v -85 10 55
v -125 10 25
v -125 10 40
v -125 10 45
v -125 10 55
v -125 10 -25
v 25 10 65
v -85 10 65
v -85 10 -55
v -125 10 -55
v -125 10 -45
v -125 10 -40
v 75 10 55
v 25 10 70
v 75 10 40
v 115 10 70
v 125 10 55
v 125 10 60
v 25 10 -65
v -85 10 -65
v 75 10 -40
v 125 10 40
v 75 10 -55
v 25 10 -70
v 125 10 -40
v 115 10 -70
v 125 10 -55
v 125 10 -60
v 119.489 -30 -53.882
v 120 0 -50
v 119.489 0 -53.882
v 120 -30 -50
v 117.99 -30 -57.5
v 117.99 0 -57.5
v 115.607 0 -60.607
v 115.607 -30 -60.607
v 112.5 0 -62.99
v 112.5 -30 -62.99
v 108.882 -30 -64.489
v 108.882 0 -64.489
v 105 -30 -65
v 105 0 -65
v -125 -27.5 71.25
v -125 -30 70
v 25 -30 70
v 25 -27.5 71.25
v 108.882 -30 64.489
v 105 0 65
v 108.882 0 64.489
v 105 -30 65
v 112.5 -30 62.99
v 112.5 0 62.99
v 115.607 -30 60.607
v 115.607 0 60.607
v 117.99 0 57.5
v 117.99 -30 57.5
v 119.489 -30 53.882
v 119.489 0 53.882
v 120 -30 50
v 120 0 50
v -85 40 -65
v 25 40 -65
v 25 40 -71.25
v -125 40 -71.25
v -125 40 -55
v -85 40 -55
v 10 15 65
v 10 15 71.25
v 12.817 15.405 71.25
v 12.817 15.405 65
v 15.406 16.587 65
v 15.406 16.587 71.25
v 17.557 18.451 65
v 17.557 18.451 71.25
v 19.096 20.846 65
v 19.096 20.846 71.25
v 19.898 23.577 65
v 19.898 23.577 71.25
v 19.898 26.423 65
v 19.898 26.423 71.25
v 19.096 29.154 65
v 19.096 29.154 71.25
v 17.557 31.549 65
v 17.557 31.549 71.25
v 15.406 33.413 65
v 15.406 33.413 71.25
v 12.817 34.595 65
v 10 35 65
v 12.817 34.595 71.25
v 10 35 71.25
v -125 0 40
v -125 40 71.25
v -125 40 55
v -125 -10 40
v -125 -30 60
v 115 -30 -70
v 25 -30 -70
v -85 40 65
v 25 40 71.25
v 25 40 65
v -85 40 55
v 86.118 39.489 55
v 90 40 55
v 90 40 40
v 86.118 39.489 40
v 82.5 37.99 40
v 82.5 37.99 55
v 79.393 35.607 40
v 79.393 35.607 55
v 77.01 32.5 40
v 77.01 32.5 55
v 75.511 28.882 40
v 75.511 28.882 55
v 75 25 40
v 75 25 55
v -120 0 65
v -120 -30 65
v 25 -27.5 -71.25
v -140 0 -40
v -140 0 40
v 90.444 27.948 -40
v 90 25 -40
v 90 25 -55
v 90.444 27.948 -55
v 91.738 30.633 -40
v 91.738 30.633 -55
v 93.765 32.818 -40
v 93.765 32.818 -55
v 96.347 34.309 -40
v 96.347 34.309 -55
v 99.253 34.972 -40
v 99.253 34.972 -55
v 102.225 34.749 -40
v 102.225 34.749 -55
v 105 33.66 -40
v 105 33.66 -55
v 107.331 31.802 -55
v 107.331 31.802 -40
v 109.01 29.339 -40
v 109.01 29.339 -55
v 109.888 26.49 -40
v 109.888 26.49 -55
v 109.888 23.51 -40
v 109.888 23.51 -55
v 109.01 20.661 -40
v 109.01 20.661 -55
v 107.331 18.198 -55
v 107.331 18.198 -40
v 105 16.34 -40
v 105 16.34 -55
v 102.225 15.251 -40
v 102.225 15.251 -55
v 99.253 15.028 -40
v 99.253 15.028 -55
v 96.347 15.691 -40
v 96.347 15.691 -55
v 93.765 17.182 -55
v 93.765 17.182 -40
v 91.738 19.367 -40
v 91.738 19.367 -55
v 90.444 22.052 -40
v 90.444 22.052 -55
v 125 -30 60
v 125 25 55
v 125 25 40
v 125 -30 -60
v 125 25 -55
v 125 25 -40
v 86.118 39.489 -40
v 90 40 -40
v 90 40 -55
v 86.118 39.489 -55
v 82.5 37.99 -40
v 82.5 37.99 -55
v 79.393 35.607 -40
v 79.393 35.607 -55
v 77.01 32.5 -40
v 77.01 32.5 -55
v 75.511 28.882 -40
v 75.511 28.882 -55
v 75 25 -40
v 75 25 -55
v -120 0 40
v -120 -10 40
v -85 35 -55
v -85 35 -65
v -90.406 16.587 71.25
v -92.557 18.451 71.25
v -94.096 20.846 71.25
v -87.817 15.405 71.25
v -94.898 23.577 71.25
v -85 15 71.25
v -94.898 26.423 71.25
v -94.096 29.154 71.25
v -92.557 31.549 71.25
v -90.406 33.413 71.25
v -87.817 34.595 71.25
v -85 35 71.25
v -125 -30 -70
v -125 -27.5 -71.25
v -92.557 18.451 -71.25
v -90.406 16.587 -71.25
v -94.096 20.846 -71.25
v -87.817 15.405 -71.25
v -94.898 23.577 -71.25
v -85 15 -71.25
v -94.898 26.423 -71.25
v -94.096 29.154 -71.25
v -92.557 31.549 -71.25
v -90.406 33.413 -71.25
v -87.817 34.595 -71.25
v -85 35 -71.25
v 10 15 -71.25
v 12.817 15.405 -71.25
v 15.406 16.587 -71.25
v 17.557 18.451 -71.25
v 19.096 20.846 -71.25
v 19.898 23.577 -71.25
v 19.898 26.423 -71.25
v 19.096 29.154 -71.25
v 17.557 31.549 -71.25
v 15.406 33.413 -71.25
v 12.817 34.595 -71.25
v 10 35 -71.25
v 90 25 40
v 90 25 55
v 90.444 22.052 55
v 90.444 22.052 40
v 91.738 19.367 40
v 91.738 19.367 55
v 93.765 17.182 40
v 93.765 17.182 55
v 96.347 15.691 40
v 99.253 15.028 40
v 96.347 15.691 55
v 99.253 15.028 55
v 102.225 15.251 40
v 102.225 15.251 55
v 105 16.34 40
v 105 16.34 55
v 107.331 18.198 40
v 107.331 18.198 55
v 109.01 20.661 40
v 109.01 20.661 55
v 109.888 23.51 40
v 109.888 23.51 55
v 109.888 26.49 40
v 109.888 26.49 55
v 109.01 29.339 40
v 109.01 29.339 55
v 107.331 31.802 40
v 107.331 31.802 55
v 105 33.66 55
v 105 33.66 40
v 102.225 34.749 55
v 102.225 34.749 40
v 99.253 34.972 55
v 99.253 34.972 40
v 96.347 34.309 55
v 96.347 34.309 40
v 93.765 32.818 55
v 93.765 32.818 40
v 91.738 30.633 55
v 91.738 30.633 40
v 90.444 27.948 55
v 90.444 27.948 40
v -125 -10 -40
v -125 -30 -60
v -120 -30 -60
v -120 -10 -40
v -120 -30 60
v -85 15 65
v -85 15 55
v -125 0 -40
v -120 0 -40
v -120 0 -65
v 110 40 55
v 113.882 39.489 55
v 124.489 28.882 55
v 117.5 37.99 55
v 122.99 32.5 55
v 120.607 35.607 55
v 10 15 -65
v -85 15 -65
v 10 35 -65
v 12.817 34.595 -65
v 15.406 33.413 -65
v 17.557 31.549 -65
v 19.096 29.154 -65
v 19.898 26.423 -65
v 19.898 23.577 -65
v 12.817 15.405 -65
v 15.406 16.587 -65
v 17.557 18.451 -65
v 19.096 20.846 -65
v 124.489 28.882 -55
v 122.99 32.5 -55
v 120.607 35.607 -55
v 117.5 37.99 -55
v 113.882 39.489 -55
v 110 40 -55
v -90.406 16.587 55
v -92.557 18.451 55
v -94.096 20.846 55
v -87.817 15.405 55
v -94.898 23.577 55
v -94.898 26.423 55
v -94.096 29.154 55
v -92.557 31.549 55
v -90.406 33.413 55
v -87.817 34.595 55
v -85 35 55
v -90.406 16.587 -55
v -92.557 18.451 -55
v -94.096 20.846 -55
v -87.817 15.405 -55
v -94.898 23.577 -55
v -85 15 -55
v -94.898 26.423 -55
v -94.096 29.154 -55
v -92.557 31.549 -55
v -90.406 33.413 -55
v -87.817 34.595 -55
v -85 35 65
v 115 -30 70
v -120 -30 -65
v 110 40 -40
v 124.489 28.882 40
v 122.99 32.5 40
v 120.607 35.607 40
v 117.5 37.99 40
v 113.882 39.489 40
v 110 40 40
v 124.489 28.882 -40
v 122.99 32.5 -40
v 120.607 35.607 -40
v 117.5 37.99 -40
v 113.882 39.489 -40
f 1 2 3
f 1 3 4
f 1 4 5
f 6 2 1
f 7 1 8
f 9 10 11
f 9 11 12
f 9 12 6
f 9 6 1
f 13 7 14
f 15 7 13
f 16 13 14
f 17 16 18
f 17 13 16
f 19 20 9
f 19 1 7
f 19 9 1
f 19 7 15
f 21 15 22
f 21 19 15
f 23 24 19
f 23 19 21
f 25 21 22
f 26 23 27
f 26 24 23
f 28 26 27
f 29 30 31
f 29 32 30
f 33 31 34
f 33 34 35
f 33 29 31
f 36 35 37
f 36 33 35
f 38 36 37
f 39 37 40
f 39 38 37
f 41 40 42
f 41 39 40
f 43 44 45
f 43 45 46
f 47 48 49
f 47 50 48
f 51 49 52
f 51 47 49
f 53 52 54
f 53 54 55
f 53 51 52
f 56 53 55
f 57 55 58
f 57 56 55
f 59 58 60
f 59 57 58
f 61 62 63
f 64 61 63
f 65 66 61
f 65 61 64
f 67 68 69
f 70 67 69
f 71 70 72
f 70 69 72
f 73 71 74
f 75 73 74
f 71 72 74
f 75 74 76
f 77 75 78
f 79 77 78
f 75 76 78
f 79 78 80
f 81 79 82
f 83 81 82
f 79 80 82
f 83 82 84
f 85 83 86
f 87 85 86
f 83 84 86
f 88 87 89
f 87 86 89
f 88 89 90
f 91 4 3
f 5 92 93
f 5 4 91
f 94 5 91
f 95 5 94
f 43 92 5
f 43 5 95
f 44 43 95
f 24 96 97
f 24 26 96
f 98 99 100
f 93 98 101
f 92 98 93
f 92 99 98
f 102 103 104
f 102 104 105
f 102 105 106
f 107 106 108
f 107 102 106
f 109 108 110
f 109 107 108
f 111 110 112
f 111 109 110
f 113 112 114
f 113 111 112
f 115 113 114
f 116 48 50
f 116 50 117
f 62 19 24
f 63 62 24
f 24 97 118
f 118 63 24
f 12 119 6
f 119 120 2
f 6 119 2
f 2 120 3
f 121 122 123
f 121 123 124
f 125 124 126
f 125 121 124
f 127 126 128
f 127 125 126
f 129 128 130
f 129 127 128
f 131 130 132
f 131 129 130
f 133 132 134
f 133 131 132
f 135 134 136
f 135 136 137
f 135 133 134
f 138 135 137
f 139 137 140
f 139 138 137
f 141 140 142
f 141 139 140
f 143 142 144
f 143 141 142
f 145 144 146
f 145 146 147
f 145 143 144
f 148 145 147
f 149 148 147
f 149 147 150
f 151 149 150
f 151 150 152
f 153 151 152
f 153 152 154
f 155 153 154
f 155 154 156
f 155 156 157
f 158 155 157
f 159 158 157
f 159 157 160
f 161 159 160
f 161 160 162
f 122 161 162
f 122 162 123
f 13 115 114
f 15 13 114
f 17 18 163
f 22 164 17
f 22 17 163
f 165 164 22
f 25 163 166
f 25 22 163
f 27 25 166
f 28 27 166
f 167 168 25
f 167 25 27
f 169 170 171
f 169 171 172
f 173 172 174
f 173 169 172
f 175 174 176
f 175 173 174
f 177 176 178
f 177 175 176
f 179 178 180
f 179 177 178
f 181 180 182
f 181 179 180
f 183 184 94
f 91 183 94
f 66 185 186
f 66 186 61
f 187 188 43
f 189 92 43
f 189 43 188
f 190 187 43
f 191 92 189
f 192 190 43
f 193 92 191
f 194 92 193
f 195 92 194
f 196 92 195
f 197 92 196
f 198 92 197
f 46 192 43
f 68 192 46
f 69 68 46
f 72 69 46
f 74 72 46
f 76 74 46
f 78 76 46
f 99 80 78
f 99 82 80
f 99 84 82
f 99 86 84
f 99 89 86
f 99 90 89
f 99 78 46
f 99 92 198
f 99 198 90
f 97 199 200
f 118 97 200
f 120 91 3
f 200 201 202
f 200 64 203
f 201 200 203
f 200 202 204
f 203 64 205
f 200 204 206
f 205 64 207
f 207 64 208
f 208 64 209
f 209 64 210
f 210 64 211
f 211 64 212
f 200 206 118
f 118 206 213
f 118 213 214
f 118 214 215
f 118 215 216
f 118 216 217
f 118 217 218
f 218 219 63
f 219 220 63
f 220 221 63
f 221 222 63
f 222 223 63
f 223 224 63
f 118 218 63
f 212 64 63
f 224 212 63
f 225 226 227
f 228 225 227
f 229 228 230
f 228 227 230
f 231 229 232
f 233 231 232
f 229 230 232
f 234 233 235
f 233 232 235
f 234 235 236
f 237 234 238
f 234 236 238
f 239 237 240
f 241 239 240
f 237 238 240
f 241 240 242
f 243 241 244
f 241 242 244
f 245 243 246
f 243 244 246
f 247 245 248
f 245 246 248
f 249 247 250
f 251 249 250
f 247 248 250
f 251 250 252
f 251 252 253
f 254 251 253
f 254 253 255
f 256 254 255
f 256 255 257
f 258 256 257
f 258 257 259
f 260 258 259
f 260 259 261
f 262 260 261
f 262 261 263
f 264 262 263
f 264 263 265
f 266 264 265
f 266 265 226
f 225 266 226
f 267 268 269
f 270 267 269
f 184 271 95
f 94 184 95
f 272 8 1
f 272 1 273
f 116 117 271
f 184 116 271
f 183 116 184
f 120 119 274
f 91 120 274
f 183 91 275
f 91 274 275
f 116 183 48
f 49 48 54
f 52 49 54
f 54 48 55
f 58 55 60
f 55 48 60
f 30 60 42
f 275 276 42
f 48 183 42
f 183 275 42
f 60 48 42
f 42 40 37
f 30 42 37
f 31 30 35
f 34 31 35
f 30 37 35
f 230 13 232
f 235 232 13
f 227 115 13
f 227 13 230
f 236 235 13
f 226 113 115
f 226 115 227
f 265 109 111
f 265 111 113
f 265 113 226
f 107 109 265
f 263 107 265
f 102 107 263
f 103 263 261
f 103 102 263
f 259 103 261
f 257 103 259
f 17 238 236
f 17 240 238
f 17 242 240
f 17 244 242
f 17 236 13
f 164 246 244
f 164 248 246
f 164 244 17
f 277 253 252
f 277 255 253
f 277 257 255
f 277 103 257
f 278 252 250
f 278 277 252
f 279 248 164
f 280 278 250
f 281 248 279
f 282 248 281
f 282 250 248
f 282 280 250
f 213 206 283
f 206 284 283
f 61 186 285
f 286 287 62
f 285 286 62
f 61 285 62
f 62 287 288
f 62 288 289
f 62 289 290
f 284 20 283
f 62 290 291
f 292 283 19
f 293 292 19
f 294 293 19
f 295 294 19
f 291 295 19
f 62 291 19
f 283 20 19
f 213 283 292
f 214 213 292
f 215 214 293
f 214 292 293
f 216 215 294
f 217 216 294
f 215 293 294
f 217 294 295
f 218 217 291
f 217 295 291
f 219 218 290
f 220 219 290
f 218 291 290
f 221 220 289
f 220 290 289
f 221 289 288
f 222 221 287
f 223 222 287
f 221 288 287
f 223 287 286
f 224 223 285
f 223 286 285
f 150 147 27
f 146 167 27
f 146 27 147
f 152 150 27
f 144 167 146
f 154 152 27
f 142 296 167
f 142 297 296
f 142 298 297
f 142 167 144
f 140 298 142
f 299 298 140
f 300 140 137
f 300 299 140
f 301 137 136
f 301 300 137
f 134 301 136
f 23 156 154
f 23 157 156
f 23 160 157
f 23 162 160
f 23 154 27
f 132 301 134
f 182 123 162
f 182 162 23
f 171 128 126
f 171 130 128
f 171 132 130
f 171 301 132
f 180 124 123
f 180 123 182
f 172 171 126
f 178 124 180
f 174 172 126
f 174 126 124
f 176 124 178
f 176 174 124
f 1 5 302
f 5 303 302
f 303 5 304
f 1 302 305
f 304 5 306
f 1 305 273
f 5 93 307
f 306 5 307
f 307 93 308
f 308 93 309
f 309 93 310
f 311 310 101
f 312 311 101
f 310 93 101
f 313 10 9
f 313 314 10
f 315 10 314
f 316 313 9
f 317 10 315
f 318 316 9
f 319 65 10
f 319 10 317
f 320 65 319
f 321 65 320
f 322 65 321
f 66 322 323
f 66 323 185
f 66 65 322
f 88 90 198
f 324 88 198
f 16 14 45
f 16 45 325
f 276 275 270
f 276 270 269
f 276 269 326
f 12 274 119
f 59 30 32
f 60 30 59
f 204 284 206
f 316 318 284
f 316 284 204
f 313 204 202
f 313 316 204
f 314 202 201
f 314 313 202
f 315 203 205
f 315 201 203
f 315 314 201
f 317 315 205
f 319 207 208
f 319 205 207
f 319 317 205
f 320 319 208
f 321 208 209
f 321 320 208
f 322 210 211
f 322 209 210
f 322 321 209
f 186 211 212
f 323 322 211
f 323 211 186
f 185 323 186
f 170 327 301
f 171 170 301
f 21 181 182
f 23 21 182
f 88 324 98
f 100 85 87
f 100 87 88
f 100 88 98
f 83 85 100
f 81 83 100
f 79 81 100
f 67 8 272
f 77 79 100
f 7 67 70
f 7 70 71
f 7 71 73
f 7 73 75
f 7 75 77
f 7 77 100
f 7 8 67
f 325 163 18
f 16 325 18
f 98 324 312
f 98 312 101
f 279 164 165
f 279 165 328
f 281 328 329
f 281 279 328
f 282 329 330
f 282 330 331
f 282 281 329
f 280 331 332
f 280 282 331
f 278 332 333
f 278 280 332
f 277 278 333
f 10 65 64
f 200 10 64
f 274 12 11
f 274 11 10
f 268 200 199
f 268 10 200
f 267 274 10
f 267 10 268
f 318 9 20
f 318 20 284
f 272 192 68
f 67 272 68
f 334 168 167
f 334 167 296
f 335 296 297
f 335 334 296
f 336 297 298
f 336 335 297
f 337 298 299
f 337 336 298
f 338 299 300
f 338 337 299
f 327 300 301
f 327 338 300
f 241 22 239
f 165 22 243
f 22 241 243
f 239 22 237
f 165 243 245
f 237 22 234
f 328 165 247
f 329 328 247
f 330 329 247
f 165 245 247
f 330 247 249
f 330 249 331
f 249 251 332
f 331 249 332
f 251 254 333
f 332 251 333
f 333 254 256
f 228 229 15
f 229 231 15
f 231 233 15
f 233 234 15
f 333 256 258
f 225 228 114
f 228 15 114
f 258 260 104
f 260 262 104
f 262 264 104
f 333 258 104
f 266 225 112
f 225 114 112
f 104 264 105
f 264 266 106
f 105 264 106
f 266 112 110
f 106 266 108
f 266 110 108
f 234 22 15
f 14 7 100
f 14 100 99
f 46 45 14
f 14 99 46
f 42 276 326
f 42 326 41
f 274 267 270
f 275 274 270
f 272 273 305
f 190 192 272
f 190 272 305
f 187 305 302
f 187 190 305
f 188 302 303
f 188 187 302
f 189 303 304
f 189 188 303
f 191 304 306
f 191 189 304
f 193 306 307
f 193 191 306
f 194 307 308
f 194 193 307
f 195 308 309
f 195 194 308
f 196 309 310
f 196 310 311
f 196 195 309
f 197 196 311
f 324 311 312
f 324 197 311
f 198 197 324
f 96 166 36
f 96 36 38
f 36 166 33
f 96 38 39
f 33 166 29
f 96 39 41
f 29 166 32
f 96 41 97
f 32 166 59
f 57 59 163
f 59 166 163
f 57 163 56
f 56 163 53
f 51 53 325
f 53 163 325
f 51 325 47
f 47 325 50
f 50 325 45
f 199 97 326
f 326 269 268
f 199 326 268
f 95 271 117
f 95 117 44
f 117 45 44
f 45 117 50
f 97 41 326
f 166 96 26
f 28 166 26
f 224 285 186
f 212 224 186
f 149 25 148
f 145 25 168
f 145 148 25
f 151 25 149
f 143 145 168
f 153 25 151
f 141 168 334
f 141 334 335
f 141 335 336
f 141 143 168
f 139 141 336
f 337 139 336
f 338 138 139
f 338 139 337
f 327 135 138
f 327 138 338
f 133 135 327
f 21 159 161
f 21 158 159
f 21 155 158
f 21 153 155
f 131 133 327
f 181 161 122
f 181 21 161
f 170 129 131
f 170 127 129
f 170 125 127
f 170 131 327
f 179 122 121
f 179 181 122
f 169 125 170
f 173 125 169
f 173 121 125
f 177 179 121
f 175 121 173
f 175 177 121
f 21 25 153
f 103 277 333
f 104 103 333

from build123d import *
from build123d.topology import SkipClean

# Parameters (mm, degrees)
SKETCH1_W            = 250
SKETCH1_H            = 140
BOSS_EXTRUDE1_DEPTH  = 10
SKETCH2_W            = 150
SKETCH2_H            = 20
SKETCH2_W_2          = 50
BOSS_EXTRUDE2_DEPTH  = 30
CUT_EXTRUDE1_DEPTH   = 120
SKETCH4_R            = 10
CUT_EXTRUDE2_DEPTH   = 150
SKETCH6_W            = 10
SKETCH6_H            = 40
CUT_EXTRUDE4_DEPTH   = 150
SKETCH7_R            = 10
CUT_EXTRUDE5_DEPTH   = 150
FILLET2_R            = 10
FILLET3_R            = 10
SKETCH13_W           = 50
SKETCH13_H           = 25
SKETCH13_H_2         = 22.244291656
CUT_EXTRUDE6_DEPTH   = 40
SKETCH14_W           = 150
SKETCH14_H           = 30
BOSS_EXTRUDE3_DEPTH  = 10
BOSS_EXTRUDE4_START  = -10
SKETCH16_W           = 150
SKETCH16_H           = 30
BOSS_EXTRUDE4_DEPTH  = 10
SKETCH17_W           = 10
SKETCH17_H           = 30
BOSS_EXTRUDE5_DEPTH  = 50
CUT_EXTRUDE7_START   = -150
SKETCH18_R           = 10
CUT_EXTRUDE7_DEPTH   = 150
SKETCH19_W           = 163.570579747
SKETCH19_H           = 99.685934981
SKETCH19_W_2         = 64.103217044
SKETCH19_H_2         = 29.878618113
SKETCH19_W_3         = 86.104744928
SKETCH19_H_3         = 39.38545115
SKETCH19_W_4         = 22.687824792
SKETCH19_H_4         = 45.375649583
CUT_EXTRUDE8_DEPTH   = 150
BOSS_EXTRUDE6_DEPTH  = 30
BOSS_EXTRUDE8_START  = 20
SKETCH21_W           = 50
SKETCH21_H           = 30
SKETCH21_R           = 10
BOSS_EXTRUDE8_DEPTH  = 20
SKETCH22_W           = 50
SKETCH22_H           = 30
SKETCH22_R           = 10
BOSS_EXTRUDE9_DEPTH  = 20
BOSS_EXTRUDE10_START = 20
SKETCH23_W           = 150
SKETCH23_H           = 30
BOSS_EXTRUDE10_DEPTH = 20
SKETCH24_W           = 150
SKETCH24_H           = 30
BOSS_EXTRUDE11_DEPTH = 20
BOSS_EXTRUDE12_DEPTH = 150
SKETCH27_W           = 150
SKETCH27_H           = 5
CUT_EXTRUDE10_DEPTH  = 40
CUT_EXTRUDE11_REACH  = 270.701
SKETCH28_W           = 27.40328495
SKETCH28_H           = 74.426737968
SKETCH28_W_2         = 23.413674561
SKETCH28_H_2         = 78.651031322
SKETCH29_W           = 80
SKETCH29_H           = 10
BOSS_EXTRUDE13_DEPTH = 15
CUT_EXTRUDE12_DEPTH  = 80
SKETCH40_W           = 150
SKETCH40_H           = 6.25
CUT_EXTRUDE16_DEPTH  = 200
CHAMFER1_SIZE        = 10
FILLET6_R            = 15
CHAMFER2_SIZE        = 20
FILLET7_R            = 15
SKETCH41_W           = 80
SKETCH41_H           = 30
CUT_EXTRUDE18_DEPTH  = 200
BOSS_EXTRUDE16_START = 10
BOSS_EXTRUDE16_DEPTH = 10
BOSS_EXTRUDE17_DEPTH = 10


with BuildPart() as part:
    # Sketch1 → Boss-Extrude1 (new body)
    with BuildSketch(Plane(origin=(0, 0, 0), x_dir=(1, 0, 0), z_dir=(0, 1, 0))):
        Rectangle(SKETCH1_W, SKETCH1_H)
    extrude(amount=BOSS_EXTRUDE1_DEPTH)

    # Sketch2 → Boss-Extrude2 (add)
    with BuildSketch(Plane(origin=(0, 10, 0), x_dir=(1, 0, 0), z_dir=(0, 1, 0))):
        with Locations((-50, 35)):
            Rectangle(SKETCH2_W, SKETCH2_H)
        with Locations((-50, -35)):
            Rectangle(SKETCH2_W, SKETCH2_H)
        Polygon((125, -20), (125, 0), (125, 20), (105, 20), (105, -20), align=None)
        with Locations((100, 60)):
            Rectangle(SKETCH2_W_2, SKETCH2_H)
        with Locations((100, -60)):
            Rectangle(SKETCH2_W_2, SKETCH2_H)
    extrude(amount=BOSS_EXTRUDE2_DEPTH)

    # Sketch3 → Cut-Extrude1 (cut)
    with BuildSketch(Plane.XY.offset(45)):
        with BuildLine():
            Line((10, 35), (-110, 35))
            ThreePointArc((-110, 35), (-120, 25), (-110, 15))
            Line((-110, 15), (10, 15))
            ThreePointArc((10, 15), (20, 25), (10, 35))
        make_face()
    extrude(amount=-CUT_EXTRUDE1_DEPTH, mode=Mode.SUBTRACT)

    # Sketch4 → Cut-Extrude2 (cut)
    with BuildSketch(Plane.XY.offset(70)):
        with Locations((100, 25)):
            Circle(SKETCH4_R)
    extrude(amount=-CUT_EXTRUDE2_DEPTH, mode=Mode.SUBTRACT)

    # Sketch6 → Cut-Extrude4 (cut)
    with BuildSketch(Plane(origin=(0, 10, 0), x_dir=(1, 0, 0), z_dir=(0, 1, 0))):
        with Locations((110, 0)):
            Rectangle(SKETCH6_W, SKETCH6_H)
    extrude(amount=CUT_EXTRUDE4_DEPTH, mode=Mode.SUBTRACT)

    # Sketch7 → Cut-Extrude5 (cut)
    with BuildSketch(Plane(origin=(125, 0, 0), x_dir=(0, 0, -1), z_dir=(1, 0, 0))):
        with Locations((0, 25)):
            Circle(SKETCH7_R)
    extrude(amount=-CUT_EXTRUDE5_DEPTH, mode=Mode.SUBTRACT)

    # Fillet2
    fillet2_edges = [part.edges().sort_by_distance(p)[0] for p in [
        (120, 40, 20),
        (120, 40, -20),
    ]]
    fillet(fillet2_edges, radius=FILLET2_R)

    # Fillet3
    fillet3_edges = [part.edges().sort_by_distance(p)[0] for p in [
        (75, 40, -60),
        (125, 40, -60),
        (75, 40, 60),
        (125, 40, 60),
    ]]
    fillet(fillet3_edges, radius=FILLET3_R)

    # Sketch13 → Cut-Extrude6 (cut)
    with BuildSketch(Plane(origin=(0, 10, 0), x_dir=(1, 0, 0), z_dir=(0, 1, 0))):
        with Locations((100, 47.5)):
            Rectangle(SKETCH13_W, SKETCH13_H)
        with Locations((100, -48.877854172)):
            Rectangle(SKETCH13_W, SKETCH13_H_2)
    extrude(amount=CUT_EXTRUDE6_DEPTH, mode=Mode.SUBTRACT)

    # Sketch14 → Boss-Extrude3 (add)
    with BuildSketch(Plane.XY.offset(70)):
        with Locations((-50, 25)):
            Rectangle(SKETCH14_W, SKETCH14_H)
        with BuildLine():
            Line((10, 35), (-85, 35))
            ThreePointArc((-85, 35), (-95, 25), (-85, 15))
            Line((-85, 15), (10, 15))
            ThreePointArc((10, 15), (20, 25), (10, 35))
        make_face(mode=Mode.SUBTRACT)
    extrude(amount=-BOSS_EXTRUDE3_DEPTH)

    # Sketch16 → Boss-Extrude4 (add)
    with BuildSketch(Plane(origin=(0, 0, -70), x_dir=(-1, 0, 0), z_dir=(0, 0, -1)).offset(BOSS_EXTRUDE4_START)):
        with Locations((50, 25)):
            Rectangle(SKETCH16_W, SKETCH16_H)
        with BuildLine():
            Line((85, 35), (-10, 35))
            ThreePointArc((-10, 35), (-20, 25), (-10, 15))
            Line((-10, 15), (85, 15))
            ThreePointArc((85, 15), (95, 25), (85, 35))
        make_face(mode=Mode.SUBTRACT)
    extrude(amount=BOSS_EXTRUDE4_DEPTH)

    # Sketch17 → Boss-Extrude5 (add)
    with BuildSketch(Plane(origin=(125, 0, 0), x_dir=(0, 0, -1), z_dir=(1, 0, 0))):
        with Locations((30, 25)):
            Rectangle(SKETCH17_W, SKETCH17_H)
        with Locations((-30, 25)):
            Rectangle(SKETCH17_W, SKETCH17_H)
    extrude(amount=-BOSS_EXTRUDE5_DEPTH)

    # Sketch18 → Cut-Extrude7 (cut)
    with BuildSketch(Plane(origin=(0, 0, -70), x_dir=(-1, 0, 0), z_dir=(0, 0, -1)).offset(CUT_EXTRUDE7_START)):
        with Locations(Location((-100, 25, 0), (0, 0, 180))):
            Circle(SKETCH18_R)
    extrude(amount=CUT_EXTRUDE7_DEPTH, mode=Mode.SUBTRACT)

    # Sketch19 → Cut-Extrude8 (cut)
    with BuildSketch(Plane(origin=(0, 10, 0), x_dir=(1, 0, 0), z_dir=(0, 1, 0))):
        with Locations((-43.214710127, 0.1358119)):
            Rectangle(SKETCH19_W, SKETCH19_H)
        with Locations((99.142687378, 64.918088447)):
            Rectangle(SKETCH19_W_2, SKETCH19_H_2)
        with Locations((110.14345132, -67.226890756)):
            Rectangle(SKETCH19_W_3, SKETCH19_H_3)
        with Locations((124.2319325, 0.52597354)):
            Rectangle(SKETCH19_W_4, SKETCH19_H_4)
    extrude(amount=CUT_EXTRUDE8_DEPTH, mode=Mode.SUBTRACT)

    # Sketch20 → Boss-Extrude6 (add)
    with BuildSketch(Plane.XZ):
        Polygon((-125, 40), (-125, 70), (125, 70), (125, -70), (-125, -70), (-125, -40), (-120, -40), (-120, -65), (120, -65), (120, 65), (-120, 65), (-120, 40), align=None)
    extrude(amount=BOSS_EXTRUDE6_DEPTH)

    # Sketch21 → Boss-Extrude8 (add)
    with SkipClean():  # the faces are left unmerged after this step: merging them gives an invalid solid
        with BuildSketch(Plane.XY.offset(35).offset(BOSS_EXTRUDE8_START)):
            with Locations((100, 25)):
                Rectangle(SKETCH21_W, SKETCH21_H)
            with Locations(Location((100, 25, 0), (0, 0, 180))):
                Circle(SKETCH21_R, mode=Mode.SUBTRACT)
        extrude(amount=-BOSS_EXTRUDE8_DEPTH)

    # Sketch22 → Boss-Extrude9 (add)
    with SkipClean():  # the faces are left unmerged after this step: merging them gives an invalid solid
        with BuildSketch(Plane(origin=(0, 0, -35), x_dir=(-1, 0, 0), z_dir=(0, 0, -1))):
            with Locations((-100, 25)):
                Rectangle(SKETCH22_W, SKETCH22_H)
            with Locations((-100, 25)):
                Circle(SKETCH22_R, mode=Mode.SUBTRACT)
        extrude(amount=BOSS_EXTRUDE9_DEPTH)

    # Sketch23 → Boss-Extrude10 (add)
    with SkipClean():  # the faces are left unmerged after this step: merging them gives an invalid solid
        with BuildSketch(Plane.XY.offset(70).offset(BOSS_EXTRUDE10_START)):
            with Locations((-50, 25)):
                Rectangle(SKETCH23_W, SKETCH23_H)
            with BuildLine():
                Line((10, 35), (-85, 35))
                ThreePointArc((-85, 35), (-95, 25), (-85, 15))
                Line((-85, 15), (10, 15))
                ThreePointArc((10, 15), (20, 25), (10, 35))
            make_face(mode=Mode.SUBTRACT)
        extrude(amount=-BOSS_EXTRUDE10_DEPTH)

    # Sketch24 → Boss-Extrude11 (add)
    with SkipClean():  # the faces are left unmerged after this step: merging them gives an invalid solid
        with BuildSketch(Plane(origin=(0, 0, -70), x_dir=(-1, 0, 0), z_dir=(0, 0, -1))):
            with Locations((50, 25)):
                Rectangle(SKETCH24_W, SKETCH24_H)
            with BuildLine():
                Line((-10, 35), (85, 35))
                ThreePointArc((85, 35), (95, 25), (85, 15))
                Line((85, 15), (-10, 15))
                ThreePointArc((-10, 15), (-20, 25), (-10, 35))
            make_face(mode=Mode.SUBTRACT)
        extrude(amount=BOSS_EXTRUDE11_DEPTH)

    # Sketch26 → Boss-Extrude12 (add)
    with SkipClean():  # the faces are left unmerged after this step: merging them gives an invalid solid
        with BuildSketch(Plane(origin=(25, 0, 0), x_dir=(0, 0, -1), z_dir=(1, 0, 0))):
            Polygon((70, -30), (90, 10), (70, 10), align=None)
            Polygon((-90, 10), (-70, 10), (-70, -30), align=None)
        extrude(amount=-BOSS_EXTRUDE12_DEPTH)

    # Sketch27 → Cut-Extrude10 (cut)
    with SkipClean():  # the faces are left unmerged after this step: merging them gives an invalid solid
        with BuildSketch(Plane(origin=(0, 10, 0), x_dir=(1, 0, 0), z_dir=(0, 1, 0))):
            with Locations((-50, 62.5)):
                Rectangle(SKETCH27_W, SKETCH27_H)
            with Locations((-50, -62.5)):
                Rectangle(SKETCH27_W, SKETCH27_H)
        extrude(amount=CUT_EXTRUDE10_DEPTH, mode=Mode.SUBTRACT)

    # Cut-Extrude11: up to this face of the body (flat: up to its plane)
    cut_extrude11_end = Plane(part.part.faces().sort_by_distance((25, 25, -80))[0])
    # Sketch28 → Cut-Extrude11 (cut, up to the picked face)
    with BuildSketch(Plane.ZY.offset(125), mode=Mode.PRIVATE) as cut_extrude11_sk1:
        with Locations((-91.201642475, 2.786631016)):
            Rectangle(SKETCH28_W, SKETCH28_H)
    cut_extrude11_tool1 = split(extrude(cut_extrude11_sk1.sketch, amount=-CUT_EXTRUDE11_REACH, mode=Mode.PRIVATE), bisect_by=cut_extrude11_end, keep=Keep.BOTH, mode=Mode.PRIVATE)
    # Sketch28 → Cut-Extrude11 (cut, up to the picked face)
    with BuildSketch(Plane.ZY.offset(125), mode=Mode.PRIVATE) as cut_extrude11_sk2:
        with Locations((89.20683728, 0.674484339)):
            Rectangle(SKETCH28_W_2, SKETCH28_H_2)
    cut_extrude11_tool2 = split(extrude(cut_extrude11_sk2.sketch, amount=-CUT_EXTRUDE11_REACH, mode=Mode.PRIVATE), bisect_by=cut_extrude11_end, keep=Keep.BOTH, mode=Mode.PRIVATE)
    add(cut_extrude11_tool1.solids().sort_by(Axis((-125, 2.786631, -91.201642), (1, 0, 0)))[0], mode=Mode.SUBTRACT)
    add(cut_extrude11_tool2.solids().sort_by(Axis((-125, 0.674484, 89.206837), (1, 0, 0)))[0], mode=Mode.SUBTRACT)

    # Sketch29 → Boss-Extrude13 (add)
    with SkipClean():  # the faces are left unmerged after this step: merging them gives an invalid solid
        with BuildSketch(Plane.ZY.offset(125)):
            with Locations((0, 5)):
                Rectangle(SKETCH29_W, SKETCH29_H)
        extrude(amount=BOSS_EXTRUDE13_DEPTH)

    # Sketch31 → Cut-Extrude12 (cut)
    with SkipClean():  # the faces are left unmerged after this step: merging them gives an invalid solid
        with BuildSketch(Plane.XY.offset(40)):
            Polygon((-140, 0), (-125, 10), (-140, 10), align=None)
        extrude(amount=-CUT_EXTRUDE12_DEPTH, mode=Mode.SUBTRACT)

    # Sketch40 → Cut-Extrude16 (cut)
    with SkipClean():  # the faces are left unmerged after this step: merging them gives an invalid solid
        with BuildSketch(Plane(origin=(0, 40, 0), x_dir=(1, 0, 0), z_dir=(0, 1, 0))):
            with Locations((-50, 74.375)):
                Rectangle(SKETCH40_W, SKETCH40_H)
            with Locations((-50, -74.375)):
                Rectangle(SKETCH40_W, SKETCH40_H)
        extrude(amount=-CUT_EXTRUDE16_DEPTH, mode=Mode.SUBTRACT)

    # Chamfer1
    chamfer1_edges = [part.edges().sort_by_distance(p)[0] for p in [
        (125, -10, 70),
        (125, -10, -70),
    ]]
    chamfer(chamfer1_edges, length=CHAMFER1_SIZE - 0.0001)  # a hair under: the kernel refuses the full size

    # Fillet6
    fillet6_edges = [part.edges().sort_by_distance(p)[0] for p in [
        (75, 40, -40),
        (125, 40, -40),
        (75, 40, 40),
        (125, 40, 40),
    ]]
    fillet(fillet6_edges, radius=FILLET6_R)

    # Chamfer2
    chamfer2_edges = [part.edges().sort_by_distance(p)[0] for p in [
        (-122.5, -30, 40),
        (-122.5, -30, -40),
    ]]
    chamfer(chamfer2_edges, length=CHAMFER2_SIZE)

    # Fillet7
    fillet7_edges = [part.edges().sort_by_distance(p)[0] for p in [
        (120, -15, 65),
        (120, -15, -65),
    ]]
    fillet(fillet7_edges, radius=FILLET7_R)

    # Sketch41 → Cut-Extrude18 (cut)
    with BuildSketch(Plane.ZY.offset(-75)):
        with Locations((0, 25)):
            Rectangle(SKETCH41_W, SKETCH41_H)
    extrude(amount=-CUT_EXTRUDE18_DEPTH, mode=Mode.SUBTRACT)

    # Sketch42 → Boss-Extrude16 (add)
    with BuildSketch(Plane.XY.offset(-65).offset(BOSS_EXTRUDE16_START)):
        with BuildLine():
            Line((-85, 35), (-85, 40))
            Line((-85, 40), (-125, 40))
            Line((-125, 40), (-125, 10))
            Line((-125, 10), (-85, 10))
            Line((-85, 10), (-85, 15))
            ThreePointArc((-85, 15), (-95, 25), (-85, 35))
        make_face()
    extrude(amount=-BOSS_EXTRUDE16_DEPTH)

    # Sketch43 → Boss-Extrude17 (add)
    with BuildSketch(Plane(origin=(0, 0, 65), x_dir=(-1, 0, 0), z_dir=(0, 0, -1))):
        with BuildLine():
            Line((85, 35), (85, 40))
            Line((85, 40), (125, 40))
            Line((125, 40), (125, 10))
            Line((125, 10), (85, 10))
            Line((85, 10), (85, 15))
            ThreePointArc((85, 15), (95, 25), (85, 35))
        make_face()
    extrude(amount=BOSS_EXTRUDE17_DEPTH)


solid = part.part
